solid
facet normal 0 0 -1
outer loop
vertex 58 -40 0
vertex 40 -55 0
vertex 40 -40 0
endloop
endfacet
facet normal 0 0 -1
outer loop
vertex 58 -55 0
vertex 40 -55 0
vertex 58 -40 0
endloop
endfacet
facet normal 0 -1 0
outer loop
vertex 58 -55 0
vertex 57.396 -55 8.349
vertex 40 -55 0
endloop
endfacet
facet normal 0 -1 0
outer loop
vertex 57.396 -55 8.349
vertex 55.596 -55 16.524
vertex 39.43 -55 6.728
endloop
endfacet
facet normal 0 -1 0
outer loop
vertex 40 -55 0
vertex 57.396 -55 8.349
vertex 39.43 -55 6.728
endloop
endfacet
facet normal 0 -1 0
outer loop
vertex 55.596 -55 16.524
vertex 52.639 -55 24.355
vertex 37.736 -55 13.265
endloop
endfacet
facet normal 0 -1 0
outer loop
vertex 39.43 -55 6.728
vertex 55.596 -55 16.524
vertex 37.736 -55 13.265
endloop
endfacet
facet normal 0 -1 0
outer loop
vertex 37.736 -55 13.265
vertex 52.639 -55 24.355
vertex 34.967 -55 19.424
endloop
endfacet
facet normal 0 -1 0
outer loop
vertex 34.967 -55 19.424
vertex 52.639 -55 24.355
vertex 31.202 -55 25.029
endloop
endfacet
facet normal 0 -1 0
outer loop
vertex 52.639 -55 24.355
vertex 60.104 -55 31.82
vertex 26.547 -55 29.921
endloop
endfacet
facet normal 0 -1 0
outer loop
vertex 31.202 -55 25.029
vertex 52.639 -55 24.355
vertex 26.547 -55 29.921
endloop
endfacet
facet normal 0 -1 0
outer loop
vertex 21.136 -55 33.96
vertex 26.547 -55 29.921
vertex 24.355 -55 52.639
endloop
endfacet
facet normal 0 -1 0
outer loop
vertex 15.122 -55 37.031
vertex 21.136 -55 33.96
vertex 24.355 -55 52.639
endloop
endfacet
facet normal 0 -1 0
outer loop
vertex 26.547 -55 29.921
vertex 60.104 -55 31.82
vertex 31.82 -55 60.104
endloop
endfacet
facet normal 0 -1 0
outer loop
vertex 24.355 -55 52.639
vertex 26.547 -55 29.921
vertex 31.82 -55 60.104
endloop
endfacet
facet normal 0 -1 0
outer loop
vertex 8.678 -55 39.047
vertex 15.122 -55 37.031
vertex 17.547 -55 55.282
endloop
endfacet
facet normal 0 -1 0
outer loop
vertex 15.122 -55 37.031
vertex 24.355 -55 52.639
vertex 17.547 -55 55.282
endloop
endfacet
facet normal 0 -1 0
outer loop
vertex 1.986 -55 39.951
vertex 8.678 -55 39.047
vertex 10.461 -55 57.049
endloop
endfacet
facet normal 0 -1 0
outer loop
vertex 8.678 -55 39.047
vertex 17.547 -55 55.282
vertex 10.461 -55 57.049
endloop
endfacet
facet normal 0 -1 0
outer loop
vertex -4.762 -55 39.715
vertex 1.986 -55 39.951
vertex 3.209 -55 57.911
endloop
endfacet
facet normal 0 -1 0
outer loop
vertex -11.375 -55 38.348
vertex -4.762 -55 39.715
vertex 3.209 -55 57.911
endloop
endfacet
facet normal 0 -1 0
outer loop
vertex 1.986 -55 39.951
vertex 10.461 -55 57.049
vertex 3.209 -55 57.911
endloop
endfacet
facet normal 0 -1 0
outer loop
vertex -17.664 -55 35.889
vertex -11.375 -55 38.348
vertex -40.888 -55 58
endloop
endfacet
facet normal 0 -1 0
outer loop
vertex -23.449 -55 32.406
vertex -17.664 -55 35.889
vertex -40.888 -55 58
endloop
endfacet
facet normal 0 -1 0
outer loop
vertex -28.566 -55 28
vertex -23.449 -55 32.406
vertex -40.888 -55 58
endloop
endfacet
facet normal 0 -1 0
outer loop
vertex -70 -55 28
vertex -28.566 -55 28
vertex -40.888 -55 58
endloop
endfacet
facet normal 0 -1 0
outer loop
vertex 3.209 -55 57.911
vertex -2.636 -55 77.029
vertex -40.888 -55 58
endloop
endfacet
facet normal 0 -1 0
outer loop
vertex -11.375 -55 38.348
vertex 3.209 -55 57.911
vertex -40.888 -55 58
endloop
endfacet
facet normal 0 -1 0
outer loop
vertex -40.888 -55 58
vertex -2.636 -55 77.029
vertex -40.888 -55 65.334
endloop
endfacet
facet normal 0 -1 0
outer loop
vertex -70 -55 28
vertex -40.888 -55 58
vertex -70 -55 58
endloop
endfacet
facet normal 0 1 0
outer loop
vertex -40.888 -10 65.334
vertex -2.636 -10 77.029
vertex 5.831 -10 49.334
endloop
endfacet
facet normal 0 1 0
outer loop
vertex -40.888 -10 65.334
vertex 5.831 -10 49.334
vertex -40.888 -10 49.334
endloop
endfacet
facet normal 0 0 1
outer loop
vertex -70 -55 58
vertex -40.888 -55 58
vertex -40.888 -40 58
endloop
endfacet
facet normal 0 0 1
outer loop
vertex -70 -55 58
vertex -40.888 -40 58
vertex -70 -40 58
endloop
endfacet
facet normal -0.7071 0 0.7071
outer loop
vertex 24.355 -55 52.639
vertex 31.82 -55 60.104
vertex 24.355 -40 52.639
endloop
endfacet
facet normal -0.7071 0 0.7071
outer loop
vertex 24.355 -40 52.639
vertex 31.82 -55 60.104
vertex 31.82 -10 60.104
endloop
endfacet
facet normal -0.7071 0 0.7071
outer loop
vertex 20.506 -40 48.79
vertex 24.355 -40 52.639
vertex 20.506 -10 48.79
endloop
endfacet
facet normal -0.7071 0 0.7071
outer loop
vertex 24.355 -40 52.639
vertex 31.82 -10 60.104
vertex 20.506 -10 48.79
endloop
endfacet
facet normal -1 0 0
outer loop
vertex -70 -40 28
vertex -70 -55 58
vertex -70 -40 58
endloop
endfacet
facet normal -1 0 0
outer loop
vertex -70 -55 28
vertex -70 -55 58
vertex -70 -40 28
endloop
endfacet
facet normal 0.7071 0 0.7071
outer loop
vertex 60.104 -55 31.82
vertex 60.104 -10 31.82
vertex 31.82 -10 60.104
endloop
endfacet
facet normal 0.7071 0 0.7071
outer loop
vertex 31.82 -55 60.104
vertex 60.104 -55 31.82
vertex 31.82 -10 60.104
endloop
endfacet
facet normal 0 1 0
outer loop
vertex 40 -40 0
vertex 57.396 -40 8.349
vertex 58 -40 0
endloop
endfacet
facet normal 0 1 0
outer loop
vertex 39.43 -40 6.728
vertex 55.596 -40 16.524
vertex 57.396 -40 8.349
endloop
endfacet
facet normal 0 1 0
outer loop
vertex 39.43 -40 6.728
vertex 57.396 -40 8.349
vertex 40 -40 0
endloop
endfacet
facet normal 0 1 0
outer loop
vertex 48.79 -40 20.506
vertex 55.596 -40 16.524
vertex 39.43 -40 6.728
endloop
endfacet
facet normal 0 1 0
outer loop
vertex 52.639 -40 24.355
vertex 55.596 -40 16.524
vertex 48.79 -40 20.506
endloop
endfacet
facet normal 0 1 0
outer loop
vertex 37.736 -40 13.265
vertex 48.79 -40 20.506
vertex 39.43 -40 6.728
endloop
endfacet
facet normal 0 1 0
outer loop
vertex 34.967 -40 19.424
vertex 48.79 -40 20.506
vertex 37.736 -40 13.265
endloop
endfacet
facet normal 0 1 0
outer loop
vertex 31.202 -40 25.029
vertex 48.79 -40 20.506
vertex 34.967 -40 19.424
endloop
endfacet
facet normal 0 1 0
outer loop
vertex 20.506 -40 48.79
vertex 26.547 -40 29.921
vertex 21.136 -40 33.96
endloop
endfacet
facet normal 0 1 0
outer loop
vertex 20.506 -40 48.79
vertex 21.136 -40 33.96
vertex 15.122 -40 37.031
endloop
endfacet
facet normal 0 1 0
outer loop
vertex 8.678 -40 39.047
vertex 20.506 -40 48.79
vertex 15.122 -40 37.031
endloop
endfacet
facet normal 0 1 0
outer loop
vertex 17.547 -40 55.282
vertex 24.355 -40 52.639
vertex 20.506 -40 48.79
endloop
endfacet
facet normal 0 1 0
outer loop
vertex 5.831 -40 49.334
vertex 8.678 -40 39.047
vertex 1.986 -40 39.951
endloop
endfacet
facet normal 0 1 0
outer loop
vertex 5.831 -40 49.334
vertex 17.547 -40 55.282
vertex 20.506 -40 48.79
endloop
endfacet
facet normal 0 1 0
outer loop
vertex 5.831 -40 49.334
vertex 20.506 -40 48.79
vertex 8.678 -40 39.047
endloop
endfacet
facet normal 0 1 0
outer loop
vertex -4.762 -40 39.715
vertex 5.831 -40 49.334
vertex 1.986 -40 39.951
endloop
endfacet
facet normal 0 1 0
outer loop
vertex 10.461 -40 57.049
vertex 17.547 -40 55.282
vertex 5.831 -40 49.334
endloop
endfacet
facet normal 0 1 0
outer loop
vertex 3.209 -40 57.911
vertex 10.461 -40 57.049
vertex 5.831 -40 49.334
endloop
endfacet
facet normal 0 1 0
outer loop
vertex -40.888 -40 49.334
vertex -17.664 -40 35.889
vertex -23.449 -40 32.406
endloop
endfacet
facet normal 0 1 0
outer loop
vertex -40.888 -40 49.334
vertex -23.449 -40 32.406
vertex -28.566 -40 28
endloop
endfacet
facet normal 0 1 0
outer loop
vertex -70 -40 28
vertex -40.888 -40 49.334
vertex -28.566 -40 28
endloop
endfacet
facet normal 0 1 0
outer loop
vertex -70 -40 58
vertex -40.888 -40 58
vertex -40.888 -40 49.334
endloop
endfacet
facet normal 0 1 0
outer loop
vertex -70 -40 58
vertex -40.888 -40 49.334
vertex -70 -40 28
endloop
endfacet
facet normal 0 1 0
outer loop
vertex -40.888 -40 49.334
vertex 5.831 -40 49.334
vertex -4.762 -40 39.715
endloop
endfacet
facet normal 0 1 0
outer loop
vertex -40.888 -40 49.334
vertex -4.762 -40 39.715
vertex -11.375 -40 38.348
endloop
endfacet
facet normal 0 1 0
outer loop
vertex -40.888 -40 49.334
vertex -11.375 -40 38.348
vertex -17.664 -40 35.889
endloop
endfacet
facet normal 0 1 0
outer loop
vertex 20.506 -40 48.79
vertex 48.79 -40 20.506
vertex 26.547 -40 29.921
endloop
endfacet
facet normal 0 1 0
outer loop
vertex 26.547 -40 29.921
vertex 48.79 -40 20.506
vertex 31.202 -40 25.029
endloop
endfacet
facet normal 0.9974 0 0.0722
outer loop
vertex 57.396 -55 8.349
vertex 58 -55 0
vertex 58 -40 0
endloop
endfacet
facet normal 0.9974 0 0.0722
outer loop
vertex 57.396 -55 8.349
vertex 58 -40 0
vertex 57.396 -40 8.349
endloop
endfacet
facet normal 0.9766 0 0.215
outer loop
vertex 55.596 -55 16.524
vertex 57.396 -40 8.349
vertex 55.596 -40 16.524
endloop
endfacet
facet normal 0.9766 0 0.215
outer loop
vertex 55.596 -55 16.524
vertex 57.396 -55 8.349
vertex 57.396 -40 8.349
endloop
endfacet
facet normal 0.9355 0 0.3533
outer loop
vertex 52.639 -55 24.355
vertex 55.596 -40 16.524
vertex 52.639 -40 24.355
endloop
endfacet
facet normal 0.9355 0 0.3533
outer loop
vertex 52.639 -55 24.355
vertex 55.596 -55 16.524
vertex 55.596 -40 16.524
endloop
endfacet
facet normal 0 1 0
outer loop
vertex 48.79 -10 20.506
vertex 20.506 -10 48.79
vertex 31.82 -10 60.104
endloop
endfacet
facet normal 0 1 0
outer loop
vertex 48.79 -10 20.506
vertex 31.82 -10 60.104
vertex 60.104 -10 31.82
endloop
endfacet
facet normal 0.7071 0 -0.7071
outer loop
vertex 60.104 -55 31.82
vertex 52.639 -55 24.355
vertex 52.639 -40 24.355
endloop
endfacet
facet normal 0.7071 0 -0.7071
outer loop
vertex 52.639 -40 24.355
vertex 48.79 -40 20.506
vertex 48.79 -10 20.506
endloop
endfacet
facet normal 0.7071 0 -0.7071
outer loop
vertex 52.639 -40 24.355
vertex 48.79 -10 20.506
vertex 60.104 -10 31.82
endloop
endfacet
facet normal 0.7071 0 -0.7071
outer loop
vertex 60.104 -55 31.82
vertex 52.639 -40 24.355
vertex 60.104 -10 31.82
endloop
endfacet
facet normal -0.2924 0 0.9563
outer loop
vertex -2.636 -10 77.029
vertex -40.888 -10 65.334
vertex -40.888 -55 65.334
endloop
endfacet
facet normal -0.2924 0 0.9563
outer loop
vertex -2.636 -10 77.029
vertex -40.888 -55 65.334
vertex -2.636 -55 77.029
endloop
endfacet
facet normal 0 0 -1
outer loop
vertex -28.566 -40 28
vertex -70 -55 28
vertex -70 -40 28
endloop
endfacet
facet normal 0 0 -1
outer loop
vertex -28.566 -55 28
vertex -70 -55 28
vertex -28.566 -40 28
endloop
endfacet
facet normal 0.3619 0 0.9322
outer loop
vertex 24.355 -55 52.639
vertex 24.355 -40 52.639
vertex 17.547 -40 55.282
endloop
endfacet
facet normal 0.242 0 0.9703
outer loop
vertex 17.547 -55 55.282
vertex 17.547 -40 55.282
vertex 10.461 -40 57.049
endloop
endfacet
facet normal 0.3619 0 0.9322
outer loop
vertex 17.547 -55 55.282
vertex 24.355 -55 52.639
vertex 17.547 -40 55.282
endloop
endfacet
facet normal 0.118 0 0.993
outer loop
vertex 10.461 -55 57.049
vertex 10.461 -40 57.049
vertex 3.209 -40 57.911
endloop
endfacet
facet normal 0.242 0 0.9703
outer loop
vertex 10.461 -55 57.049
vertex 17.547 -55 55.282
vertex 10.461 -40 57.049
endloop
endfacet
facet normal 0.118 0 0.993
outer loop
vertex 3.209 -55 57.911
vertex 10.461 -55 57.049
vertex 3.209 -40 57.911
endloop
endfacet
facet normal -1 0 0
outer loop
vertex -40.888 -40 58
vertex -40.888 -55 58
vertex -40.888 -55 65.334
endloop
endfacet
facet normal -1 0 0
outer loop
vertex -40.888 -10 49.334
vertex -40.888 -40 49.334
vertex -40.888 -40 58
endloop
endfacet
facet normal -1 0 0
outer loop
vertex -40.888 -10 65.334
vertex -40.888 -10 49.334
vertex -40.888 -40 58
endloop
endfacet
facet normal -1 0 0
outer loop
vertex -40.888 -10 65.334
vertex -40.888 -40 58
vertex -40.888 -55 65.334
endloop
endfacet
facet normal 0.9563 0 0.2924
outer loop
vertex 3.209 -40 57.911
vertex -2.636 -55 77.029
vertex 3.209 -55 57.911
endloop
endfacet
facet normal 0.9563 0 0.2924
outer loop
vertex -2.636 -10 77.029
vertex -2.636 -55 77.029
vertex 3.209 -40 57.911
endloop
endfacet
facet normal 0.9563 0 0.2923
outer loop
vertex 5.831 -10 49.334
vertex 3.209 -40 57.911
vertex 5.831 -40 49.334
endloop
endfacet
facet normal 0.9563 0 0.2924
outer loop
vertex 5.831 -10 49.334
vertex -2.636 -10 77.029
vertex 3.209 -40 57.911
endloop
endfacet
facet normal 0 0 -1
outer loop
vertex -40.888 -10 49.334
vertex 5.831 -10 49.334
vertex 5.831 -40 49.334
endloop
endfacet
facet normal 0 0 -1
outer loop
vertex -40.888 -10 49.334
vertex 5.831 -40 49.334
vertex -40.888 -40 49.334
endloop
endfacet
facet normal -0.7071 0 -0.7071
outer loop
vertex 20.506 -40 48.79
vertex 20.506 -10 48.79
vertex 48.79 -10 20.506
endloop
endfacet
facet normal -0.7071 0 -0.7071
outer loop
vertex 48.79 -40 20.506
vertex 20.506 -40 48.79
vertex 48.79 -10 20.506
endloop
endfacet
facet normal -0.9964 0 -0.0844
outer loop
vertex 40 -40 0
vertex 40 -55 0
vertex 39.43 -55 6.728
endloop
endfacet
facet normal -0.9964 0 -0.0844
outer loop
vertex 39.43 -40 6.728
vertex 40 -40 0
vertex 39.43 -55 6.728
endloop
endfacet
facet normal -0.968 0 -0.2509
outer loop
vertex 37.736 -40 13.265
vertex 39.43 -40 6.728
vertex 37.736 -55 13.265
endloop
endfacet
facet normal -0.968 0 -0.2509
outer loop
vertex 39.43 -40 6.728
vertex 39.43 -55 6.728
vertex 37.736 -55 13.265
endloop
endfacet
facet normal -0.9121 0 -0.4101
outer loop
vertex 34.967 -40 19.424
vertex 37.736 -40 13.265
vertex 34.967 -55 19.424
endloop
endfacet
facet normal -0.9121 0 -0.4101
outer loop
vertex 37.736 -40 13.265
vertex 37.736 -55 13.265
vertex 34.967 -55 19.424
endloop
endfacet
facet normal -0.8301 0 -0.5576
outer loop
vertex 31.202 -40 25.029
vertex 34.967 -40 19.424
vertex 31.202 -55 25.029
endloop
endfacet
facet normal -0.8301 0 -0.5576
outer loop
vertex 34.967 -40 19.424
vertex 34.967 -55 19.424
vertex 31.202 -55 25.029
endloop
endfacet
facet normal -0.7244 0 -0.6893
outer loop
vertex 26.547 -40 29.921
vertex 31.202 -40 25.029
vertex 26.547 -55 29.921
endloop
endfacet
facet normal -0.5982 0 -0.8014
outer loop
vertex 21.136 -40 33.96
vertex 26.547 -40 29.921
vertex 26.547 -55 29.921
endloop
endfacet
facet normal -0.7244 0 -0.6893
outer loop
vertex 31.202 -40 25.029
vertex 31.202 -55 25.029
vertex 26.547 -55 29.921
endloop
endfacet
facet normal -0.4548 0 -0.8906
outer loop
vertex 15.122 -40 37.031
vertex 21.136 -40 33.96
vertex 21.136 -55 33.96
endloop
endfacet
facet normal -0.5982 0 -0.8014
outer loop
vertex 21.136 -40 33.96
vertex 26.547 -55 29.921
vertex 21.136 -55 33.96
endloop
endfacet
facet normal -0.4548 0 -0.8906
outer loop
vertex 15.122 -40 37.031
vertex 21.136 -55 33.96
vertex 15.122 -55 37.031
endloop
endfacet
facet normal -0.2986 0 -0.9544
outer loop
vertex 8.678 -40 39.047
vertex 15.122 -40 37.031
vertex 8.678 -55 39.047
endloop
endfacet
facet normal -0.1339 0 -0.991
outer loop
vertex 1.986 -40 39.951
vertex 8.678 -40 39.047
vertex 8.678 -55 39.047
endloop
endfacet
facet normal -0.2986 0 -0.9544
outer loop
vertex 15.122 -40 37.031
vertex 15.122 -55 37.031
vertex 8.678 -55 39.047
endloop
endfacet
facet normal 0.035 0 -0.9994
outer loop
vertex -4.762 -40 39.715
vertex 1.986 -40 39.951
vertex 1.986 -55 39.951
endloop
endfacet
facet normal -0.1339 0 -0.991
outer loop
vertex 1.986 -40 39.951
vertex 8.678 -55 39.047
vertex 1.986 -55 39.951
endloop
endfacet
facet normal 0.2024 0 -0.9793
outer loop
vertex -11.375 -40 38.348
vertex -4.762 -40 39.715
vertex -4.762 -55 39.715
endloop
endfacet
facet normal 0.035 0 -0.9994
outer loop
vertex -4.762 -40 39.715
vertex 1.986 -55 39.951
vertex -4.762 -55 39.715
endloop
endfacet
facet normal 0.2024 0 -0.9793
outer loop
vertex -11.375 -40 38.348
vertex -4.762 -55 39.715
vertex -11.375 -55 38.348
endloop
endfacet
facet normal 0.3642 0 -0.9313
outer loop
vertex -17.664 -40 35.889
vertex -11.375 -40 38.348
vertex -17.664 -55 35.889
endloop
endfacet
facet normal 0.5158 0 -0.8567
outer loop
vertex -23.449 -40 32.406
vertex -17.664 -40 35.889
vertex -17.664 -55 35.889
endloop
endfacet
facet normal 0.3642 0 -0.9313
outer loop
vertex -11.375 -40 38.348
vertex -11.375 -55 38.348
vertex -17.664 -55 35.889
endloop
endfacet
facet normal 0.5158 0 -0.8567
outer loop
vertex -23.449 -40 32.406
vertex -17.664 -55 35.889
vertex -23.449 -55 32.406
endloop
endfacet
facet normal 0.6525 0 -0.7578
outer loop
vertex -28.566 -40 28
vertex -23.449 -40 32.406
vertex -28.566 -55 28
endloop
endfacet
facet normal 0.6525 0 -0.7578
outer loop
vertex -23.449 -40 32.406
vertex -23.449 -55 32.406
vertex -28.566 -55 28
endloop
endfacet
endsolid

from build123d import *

# Parameters (mm, degrees)
PAD_DEPTH    = 45
PAD001_DEPTH = 15


with BuildPart() as part:
    # Sketch001 → Pad (new body)
    with BuildSketch(Plane.XZ.offset(10)):
        Polygon((-40.888459, 65.334051), (-2.636269, 77.02892), (5.830902, 49.334051), (-40.888459, 49.334051), align=None)
        Polygon((20.506097, 48.790368), (48.790368, 20.506097), (60.104076, 31.819805), (31.819805, 60.104076), align=None)
    extrude(amount=PAD_DEPTH)

    # Sketch → Pad001 (new body)
    with BuildSketch(Plane.XZ.offset(55)):
        with BuildLine():
            ThreePointArc((40, 0), (15.122358, 37.031261), (-28.565714, 28))
            Line((-70, 28), (-28.565714, 28))
            Line((-70, 58), (-70, 28))
            Line((0, 58), (-70, 58))
            ThreePointArc((58, 0), (41.012193, 41.012193), (0, 58))
            Line((40, 0), (58, 0))
        make_face()
    extrude(amount=-PAD001_DEPTH)


solid = part.part
